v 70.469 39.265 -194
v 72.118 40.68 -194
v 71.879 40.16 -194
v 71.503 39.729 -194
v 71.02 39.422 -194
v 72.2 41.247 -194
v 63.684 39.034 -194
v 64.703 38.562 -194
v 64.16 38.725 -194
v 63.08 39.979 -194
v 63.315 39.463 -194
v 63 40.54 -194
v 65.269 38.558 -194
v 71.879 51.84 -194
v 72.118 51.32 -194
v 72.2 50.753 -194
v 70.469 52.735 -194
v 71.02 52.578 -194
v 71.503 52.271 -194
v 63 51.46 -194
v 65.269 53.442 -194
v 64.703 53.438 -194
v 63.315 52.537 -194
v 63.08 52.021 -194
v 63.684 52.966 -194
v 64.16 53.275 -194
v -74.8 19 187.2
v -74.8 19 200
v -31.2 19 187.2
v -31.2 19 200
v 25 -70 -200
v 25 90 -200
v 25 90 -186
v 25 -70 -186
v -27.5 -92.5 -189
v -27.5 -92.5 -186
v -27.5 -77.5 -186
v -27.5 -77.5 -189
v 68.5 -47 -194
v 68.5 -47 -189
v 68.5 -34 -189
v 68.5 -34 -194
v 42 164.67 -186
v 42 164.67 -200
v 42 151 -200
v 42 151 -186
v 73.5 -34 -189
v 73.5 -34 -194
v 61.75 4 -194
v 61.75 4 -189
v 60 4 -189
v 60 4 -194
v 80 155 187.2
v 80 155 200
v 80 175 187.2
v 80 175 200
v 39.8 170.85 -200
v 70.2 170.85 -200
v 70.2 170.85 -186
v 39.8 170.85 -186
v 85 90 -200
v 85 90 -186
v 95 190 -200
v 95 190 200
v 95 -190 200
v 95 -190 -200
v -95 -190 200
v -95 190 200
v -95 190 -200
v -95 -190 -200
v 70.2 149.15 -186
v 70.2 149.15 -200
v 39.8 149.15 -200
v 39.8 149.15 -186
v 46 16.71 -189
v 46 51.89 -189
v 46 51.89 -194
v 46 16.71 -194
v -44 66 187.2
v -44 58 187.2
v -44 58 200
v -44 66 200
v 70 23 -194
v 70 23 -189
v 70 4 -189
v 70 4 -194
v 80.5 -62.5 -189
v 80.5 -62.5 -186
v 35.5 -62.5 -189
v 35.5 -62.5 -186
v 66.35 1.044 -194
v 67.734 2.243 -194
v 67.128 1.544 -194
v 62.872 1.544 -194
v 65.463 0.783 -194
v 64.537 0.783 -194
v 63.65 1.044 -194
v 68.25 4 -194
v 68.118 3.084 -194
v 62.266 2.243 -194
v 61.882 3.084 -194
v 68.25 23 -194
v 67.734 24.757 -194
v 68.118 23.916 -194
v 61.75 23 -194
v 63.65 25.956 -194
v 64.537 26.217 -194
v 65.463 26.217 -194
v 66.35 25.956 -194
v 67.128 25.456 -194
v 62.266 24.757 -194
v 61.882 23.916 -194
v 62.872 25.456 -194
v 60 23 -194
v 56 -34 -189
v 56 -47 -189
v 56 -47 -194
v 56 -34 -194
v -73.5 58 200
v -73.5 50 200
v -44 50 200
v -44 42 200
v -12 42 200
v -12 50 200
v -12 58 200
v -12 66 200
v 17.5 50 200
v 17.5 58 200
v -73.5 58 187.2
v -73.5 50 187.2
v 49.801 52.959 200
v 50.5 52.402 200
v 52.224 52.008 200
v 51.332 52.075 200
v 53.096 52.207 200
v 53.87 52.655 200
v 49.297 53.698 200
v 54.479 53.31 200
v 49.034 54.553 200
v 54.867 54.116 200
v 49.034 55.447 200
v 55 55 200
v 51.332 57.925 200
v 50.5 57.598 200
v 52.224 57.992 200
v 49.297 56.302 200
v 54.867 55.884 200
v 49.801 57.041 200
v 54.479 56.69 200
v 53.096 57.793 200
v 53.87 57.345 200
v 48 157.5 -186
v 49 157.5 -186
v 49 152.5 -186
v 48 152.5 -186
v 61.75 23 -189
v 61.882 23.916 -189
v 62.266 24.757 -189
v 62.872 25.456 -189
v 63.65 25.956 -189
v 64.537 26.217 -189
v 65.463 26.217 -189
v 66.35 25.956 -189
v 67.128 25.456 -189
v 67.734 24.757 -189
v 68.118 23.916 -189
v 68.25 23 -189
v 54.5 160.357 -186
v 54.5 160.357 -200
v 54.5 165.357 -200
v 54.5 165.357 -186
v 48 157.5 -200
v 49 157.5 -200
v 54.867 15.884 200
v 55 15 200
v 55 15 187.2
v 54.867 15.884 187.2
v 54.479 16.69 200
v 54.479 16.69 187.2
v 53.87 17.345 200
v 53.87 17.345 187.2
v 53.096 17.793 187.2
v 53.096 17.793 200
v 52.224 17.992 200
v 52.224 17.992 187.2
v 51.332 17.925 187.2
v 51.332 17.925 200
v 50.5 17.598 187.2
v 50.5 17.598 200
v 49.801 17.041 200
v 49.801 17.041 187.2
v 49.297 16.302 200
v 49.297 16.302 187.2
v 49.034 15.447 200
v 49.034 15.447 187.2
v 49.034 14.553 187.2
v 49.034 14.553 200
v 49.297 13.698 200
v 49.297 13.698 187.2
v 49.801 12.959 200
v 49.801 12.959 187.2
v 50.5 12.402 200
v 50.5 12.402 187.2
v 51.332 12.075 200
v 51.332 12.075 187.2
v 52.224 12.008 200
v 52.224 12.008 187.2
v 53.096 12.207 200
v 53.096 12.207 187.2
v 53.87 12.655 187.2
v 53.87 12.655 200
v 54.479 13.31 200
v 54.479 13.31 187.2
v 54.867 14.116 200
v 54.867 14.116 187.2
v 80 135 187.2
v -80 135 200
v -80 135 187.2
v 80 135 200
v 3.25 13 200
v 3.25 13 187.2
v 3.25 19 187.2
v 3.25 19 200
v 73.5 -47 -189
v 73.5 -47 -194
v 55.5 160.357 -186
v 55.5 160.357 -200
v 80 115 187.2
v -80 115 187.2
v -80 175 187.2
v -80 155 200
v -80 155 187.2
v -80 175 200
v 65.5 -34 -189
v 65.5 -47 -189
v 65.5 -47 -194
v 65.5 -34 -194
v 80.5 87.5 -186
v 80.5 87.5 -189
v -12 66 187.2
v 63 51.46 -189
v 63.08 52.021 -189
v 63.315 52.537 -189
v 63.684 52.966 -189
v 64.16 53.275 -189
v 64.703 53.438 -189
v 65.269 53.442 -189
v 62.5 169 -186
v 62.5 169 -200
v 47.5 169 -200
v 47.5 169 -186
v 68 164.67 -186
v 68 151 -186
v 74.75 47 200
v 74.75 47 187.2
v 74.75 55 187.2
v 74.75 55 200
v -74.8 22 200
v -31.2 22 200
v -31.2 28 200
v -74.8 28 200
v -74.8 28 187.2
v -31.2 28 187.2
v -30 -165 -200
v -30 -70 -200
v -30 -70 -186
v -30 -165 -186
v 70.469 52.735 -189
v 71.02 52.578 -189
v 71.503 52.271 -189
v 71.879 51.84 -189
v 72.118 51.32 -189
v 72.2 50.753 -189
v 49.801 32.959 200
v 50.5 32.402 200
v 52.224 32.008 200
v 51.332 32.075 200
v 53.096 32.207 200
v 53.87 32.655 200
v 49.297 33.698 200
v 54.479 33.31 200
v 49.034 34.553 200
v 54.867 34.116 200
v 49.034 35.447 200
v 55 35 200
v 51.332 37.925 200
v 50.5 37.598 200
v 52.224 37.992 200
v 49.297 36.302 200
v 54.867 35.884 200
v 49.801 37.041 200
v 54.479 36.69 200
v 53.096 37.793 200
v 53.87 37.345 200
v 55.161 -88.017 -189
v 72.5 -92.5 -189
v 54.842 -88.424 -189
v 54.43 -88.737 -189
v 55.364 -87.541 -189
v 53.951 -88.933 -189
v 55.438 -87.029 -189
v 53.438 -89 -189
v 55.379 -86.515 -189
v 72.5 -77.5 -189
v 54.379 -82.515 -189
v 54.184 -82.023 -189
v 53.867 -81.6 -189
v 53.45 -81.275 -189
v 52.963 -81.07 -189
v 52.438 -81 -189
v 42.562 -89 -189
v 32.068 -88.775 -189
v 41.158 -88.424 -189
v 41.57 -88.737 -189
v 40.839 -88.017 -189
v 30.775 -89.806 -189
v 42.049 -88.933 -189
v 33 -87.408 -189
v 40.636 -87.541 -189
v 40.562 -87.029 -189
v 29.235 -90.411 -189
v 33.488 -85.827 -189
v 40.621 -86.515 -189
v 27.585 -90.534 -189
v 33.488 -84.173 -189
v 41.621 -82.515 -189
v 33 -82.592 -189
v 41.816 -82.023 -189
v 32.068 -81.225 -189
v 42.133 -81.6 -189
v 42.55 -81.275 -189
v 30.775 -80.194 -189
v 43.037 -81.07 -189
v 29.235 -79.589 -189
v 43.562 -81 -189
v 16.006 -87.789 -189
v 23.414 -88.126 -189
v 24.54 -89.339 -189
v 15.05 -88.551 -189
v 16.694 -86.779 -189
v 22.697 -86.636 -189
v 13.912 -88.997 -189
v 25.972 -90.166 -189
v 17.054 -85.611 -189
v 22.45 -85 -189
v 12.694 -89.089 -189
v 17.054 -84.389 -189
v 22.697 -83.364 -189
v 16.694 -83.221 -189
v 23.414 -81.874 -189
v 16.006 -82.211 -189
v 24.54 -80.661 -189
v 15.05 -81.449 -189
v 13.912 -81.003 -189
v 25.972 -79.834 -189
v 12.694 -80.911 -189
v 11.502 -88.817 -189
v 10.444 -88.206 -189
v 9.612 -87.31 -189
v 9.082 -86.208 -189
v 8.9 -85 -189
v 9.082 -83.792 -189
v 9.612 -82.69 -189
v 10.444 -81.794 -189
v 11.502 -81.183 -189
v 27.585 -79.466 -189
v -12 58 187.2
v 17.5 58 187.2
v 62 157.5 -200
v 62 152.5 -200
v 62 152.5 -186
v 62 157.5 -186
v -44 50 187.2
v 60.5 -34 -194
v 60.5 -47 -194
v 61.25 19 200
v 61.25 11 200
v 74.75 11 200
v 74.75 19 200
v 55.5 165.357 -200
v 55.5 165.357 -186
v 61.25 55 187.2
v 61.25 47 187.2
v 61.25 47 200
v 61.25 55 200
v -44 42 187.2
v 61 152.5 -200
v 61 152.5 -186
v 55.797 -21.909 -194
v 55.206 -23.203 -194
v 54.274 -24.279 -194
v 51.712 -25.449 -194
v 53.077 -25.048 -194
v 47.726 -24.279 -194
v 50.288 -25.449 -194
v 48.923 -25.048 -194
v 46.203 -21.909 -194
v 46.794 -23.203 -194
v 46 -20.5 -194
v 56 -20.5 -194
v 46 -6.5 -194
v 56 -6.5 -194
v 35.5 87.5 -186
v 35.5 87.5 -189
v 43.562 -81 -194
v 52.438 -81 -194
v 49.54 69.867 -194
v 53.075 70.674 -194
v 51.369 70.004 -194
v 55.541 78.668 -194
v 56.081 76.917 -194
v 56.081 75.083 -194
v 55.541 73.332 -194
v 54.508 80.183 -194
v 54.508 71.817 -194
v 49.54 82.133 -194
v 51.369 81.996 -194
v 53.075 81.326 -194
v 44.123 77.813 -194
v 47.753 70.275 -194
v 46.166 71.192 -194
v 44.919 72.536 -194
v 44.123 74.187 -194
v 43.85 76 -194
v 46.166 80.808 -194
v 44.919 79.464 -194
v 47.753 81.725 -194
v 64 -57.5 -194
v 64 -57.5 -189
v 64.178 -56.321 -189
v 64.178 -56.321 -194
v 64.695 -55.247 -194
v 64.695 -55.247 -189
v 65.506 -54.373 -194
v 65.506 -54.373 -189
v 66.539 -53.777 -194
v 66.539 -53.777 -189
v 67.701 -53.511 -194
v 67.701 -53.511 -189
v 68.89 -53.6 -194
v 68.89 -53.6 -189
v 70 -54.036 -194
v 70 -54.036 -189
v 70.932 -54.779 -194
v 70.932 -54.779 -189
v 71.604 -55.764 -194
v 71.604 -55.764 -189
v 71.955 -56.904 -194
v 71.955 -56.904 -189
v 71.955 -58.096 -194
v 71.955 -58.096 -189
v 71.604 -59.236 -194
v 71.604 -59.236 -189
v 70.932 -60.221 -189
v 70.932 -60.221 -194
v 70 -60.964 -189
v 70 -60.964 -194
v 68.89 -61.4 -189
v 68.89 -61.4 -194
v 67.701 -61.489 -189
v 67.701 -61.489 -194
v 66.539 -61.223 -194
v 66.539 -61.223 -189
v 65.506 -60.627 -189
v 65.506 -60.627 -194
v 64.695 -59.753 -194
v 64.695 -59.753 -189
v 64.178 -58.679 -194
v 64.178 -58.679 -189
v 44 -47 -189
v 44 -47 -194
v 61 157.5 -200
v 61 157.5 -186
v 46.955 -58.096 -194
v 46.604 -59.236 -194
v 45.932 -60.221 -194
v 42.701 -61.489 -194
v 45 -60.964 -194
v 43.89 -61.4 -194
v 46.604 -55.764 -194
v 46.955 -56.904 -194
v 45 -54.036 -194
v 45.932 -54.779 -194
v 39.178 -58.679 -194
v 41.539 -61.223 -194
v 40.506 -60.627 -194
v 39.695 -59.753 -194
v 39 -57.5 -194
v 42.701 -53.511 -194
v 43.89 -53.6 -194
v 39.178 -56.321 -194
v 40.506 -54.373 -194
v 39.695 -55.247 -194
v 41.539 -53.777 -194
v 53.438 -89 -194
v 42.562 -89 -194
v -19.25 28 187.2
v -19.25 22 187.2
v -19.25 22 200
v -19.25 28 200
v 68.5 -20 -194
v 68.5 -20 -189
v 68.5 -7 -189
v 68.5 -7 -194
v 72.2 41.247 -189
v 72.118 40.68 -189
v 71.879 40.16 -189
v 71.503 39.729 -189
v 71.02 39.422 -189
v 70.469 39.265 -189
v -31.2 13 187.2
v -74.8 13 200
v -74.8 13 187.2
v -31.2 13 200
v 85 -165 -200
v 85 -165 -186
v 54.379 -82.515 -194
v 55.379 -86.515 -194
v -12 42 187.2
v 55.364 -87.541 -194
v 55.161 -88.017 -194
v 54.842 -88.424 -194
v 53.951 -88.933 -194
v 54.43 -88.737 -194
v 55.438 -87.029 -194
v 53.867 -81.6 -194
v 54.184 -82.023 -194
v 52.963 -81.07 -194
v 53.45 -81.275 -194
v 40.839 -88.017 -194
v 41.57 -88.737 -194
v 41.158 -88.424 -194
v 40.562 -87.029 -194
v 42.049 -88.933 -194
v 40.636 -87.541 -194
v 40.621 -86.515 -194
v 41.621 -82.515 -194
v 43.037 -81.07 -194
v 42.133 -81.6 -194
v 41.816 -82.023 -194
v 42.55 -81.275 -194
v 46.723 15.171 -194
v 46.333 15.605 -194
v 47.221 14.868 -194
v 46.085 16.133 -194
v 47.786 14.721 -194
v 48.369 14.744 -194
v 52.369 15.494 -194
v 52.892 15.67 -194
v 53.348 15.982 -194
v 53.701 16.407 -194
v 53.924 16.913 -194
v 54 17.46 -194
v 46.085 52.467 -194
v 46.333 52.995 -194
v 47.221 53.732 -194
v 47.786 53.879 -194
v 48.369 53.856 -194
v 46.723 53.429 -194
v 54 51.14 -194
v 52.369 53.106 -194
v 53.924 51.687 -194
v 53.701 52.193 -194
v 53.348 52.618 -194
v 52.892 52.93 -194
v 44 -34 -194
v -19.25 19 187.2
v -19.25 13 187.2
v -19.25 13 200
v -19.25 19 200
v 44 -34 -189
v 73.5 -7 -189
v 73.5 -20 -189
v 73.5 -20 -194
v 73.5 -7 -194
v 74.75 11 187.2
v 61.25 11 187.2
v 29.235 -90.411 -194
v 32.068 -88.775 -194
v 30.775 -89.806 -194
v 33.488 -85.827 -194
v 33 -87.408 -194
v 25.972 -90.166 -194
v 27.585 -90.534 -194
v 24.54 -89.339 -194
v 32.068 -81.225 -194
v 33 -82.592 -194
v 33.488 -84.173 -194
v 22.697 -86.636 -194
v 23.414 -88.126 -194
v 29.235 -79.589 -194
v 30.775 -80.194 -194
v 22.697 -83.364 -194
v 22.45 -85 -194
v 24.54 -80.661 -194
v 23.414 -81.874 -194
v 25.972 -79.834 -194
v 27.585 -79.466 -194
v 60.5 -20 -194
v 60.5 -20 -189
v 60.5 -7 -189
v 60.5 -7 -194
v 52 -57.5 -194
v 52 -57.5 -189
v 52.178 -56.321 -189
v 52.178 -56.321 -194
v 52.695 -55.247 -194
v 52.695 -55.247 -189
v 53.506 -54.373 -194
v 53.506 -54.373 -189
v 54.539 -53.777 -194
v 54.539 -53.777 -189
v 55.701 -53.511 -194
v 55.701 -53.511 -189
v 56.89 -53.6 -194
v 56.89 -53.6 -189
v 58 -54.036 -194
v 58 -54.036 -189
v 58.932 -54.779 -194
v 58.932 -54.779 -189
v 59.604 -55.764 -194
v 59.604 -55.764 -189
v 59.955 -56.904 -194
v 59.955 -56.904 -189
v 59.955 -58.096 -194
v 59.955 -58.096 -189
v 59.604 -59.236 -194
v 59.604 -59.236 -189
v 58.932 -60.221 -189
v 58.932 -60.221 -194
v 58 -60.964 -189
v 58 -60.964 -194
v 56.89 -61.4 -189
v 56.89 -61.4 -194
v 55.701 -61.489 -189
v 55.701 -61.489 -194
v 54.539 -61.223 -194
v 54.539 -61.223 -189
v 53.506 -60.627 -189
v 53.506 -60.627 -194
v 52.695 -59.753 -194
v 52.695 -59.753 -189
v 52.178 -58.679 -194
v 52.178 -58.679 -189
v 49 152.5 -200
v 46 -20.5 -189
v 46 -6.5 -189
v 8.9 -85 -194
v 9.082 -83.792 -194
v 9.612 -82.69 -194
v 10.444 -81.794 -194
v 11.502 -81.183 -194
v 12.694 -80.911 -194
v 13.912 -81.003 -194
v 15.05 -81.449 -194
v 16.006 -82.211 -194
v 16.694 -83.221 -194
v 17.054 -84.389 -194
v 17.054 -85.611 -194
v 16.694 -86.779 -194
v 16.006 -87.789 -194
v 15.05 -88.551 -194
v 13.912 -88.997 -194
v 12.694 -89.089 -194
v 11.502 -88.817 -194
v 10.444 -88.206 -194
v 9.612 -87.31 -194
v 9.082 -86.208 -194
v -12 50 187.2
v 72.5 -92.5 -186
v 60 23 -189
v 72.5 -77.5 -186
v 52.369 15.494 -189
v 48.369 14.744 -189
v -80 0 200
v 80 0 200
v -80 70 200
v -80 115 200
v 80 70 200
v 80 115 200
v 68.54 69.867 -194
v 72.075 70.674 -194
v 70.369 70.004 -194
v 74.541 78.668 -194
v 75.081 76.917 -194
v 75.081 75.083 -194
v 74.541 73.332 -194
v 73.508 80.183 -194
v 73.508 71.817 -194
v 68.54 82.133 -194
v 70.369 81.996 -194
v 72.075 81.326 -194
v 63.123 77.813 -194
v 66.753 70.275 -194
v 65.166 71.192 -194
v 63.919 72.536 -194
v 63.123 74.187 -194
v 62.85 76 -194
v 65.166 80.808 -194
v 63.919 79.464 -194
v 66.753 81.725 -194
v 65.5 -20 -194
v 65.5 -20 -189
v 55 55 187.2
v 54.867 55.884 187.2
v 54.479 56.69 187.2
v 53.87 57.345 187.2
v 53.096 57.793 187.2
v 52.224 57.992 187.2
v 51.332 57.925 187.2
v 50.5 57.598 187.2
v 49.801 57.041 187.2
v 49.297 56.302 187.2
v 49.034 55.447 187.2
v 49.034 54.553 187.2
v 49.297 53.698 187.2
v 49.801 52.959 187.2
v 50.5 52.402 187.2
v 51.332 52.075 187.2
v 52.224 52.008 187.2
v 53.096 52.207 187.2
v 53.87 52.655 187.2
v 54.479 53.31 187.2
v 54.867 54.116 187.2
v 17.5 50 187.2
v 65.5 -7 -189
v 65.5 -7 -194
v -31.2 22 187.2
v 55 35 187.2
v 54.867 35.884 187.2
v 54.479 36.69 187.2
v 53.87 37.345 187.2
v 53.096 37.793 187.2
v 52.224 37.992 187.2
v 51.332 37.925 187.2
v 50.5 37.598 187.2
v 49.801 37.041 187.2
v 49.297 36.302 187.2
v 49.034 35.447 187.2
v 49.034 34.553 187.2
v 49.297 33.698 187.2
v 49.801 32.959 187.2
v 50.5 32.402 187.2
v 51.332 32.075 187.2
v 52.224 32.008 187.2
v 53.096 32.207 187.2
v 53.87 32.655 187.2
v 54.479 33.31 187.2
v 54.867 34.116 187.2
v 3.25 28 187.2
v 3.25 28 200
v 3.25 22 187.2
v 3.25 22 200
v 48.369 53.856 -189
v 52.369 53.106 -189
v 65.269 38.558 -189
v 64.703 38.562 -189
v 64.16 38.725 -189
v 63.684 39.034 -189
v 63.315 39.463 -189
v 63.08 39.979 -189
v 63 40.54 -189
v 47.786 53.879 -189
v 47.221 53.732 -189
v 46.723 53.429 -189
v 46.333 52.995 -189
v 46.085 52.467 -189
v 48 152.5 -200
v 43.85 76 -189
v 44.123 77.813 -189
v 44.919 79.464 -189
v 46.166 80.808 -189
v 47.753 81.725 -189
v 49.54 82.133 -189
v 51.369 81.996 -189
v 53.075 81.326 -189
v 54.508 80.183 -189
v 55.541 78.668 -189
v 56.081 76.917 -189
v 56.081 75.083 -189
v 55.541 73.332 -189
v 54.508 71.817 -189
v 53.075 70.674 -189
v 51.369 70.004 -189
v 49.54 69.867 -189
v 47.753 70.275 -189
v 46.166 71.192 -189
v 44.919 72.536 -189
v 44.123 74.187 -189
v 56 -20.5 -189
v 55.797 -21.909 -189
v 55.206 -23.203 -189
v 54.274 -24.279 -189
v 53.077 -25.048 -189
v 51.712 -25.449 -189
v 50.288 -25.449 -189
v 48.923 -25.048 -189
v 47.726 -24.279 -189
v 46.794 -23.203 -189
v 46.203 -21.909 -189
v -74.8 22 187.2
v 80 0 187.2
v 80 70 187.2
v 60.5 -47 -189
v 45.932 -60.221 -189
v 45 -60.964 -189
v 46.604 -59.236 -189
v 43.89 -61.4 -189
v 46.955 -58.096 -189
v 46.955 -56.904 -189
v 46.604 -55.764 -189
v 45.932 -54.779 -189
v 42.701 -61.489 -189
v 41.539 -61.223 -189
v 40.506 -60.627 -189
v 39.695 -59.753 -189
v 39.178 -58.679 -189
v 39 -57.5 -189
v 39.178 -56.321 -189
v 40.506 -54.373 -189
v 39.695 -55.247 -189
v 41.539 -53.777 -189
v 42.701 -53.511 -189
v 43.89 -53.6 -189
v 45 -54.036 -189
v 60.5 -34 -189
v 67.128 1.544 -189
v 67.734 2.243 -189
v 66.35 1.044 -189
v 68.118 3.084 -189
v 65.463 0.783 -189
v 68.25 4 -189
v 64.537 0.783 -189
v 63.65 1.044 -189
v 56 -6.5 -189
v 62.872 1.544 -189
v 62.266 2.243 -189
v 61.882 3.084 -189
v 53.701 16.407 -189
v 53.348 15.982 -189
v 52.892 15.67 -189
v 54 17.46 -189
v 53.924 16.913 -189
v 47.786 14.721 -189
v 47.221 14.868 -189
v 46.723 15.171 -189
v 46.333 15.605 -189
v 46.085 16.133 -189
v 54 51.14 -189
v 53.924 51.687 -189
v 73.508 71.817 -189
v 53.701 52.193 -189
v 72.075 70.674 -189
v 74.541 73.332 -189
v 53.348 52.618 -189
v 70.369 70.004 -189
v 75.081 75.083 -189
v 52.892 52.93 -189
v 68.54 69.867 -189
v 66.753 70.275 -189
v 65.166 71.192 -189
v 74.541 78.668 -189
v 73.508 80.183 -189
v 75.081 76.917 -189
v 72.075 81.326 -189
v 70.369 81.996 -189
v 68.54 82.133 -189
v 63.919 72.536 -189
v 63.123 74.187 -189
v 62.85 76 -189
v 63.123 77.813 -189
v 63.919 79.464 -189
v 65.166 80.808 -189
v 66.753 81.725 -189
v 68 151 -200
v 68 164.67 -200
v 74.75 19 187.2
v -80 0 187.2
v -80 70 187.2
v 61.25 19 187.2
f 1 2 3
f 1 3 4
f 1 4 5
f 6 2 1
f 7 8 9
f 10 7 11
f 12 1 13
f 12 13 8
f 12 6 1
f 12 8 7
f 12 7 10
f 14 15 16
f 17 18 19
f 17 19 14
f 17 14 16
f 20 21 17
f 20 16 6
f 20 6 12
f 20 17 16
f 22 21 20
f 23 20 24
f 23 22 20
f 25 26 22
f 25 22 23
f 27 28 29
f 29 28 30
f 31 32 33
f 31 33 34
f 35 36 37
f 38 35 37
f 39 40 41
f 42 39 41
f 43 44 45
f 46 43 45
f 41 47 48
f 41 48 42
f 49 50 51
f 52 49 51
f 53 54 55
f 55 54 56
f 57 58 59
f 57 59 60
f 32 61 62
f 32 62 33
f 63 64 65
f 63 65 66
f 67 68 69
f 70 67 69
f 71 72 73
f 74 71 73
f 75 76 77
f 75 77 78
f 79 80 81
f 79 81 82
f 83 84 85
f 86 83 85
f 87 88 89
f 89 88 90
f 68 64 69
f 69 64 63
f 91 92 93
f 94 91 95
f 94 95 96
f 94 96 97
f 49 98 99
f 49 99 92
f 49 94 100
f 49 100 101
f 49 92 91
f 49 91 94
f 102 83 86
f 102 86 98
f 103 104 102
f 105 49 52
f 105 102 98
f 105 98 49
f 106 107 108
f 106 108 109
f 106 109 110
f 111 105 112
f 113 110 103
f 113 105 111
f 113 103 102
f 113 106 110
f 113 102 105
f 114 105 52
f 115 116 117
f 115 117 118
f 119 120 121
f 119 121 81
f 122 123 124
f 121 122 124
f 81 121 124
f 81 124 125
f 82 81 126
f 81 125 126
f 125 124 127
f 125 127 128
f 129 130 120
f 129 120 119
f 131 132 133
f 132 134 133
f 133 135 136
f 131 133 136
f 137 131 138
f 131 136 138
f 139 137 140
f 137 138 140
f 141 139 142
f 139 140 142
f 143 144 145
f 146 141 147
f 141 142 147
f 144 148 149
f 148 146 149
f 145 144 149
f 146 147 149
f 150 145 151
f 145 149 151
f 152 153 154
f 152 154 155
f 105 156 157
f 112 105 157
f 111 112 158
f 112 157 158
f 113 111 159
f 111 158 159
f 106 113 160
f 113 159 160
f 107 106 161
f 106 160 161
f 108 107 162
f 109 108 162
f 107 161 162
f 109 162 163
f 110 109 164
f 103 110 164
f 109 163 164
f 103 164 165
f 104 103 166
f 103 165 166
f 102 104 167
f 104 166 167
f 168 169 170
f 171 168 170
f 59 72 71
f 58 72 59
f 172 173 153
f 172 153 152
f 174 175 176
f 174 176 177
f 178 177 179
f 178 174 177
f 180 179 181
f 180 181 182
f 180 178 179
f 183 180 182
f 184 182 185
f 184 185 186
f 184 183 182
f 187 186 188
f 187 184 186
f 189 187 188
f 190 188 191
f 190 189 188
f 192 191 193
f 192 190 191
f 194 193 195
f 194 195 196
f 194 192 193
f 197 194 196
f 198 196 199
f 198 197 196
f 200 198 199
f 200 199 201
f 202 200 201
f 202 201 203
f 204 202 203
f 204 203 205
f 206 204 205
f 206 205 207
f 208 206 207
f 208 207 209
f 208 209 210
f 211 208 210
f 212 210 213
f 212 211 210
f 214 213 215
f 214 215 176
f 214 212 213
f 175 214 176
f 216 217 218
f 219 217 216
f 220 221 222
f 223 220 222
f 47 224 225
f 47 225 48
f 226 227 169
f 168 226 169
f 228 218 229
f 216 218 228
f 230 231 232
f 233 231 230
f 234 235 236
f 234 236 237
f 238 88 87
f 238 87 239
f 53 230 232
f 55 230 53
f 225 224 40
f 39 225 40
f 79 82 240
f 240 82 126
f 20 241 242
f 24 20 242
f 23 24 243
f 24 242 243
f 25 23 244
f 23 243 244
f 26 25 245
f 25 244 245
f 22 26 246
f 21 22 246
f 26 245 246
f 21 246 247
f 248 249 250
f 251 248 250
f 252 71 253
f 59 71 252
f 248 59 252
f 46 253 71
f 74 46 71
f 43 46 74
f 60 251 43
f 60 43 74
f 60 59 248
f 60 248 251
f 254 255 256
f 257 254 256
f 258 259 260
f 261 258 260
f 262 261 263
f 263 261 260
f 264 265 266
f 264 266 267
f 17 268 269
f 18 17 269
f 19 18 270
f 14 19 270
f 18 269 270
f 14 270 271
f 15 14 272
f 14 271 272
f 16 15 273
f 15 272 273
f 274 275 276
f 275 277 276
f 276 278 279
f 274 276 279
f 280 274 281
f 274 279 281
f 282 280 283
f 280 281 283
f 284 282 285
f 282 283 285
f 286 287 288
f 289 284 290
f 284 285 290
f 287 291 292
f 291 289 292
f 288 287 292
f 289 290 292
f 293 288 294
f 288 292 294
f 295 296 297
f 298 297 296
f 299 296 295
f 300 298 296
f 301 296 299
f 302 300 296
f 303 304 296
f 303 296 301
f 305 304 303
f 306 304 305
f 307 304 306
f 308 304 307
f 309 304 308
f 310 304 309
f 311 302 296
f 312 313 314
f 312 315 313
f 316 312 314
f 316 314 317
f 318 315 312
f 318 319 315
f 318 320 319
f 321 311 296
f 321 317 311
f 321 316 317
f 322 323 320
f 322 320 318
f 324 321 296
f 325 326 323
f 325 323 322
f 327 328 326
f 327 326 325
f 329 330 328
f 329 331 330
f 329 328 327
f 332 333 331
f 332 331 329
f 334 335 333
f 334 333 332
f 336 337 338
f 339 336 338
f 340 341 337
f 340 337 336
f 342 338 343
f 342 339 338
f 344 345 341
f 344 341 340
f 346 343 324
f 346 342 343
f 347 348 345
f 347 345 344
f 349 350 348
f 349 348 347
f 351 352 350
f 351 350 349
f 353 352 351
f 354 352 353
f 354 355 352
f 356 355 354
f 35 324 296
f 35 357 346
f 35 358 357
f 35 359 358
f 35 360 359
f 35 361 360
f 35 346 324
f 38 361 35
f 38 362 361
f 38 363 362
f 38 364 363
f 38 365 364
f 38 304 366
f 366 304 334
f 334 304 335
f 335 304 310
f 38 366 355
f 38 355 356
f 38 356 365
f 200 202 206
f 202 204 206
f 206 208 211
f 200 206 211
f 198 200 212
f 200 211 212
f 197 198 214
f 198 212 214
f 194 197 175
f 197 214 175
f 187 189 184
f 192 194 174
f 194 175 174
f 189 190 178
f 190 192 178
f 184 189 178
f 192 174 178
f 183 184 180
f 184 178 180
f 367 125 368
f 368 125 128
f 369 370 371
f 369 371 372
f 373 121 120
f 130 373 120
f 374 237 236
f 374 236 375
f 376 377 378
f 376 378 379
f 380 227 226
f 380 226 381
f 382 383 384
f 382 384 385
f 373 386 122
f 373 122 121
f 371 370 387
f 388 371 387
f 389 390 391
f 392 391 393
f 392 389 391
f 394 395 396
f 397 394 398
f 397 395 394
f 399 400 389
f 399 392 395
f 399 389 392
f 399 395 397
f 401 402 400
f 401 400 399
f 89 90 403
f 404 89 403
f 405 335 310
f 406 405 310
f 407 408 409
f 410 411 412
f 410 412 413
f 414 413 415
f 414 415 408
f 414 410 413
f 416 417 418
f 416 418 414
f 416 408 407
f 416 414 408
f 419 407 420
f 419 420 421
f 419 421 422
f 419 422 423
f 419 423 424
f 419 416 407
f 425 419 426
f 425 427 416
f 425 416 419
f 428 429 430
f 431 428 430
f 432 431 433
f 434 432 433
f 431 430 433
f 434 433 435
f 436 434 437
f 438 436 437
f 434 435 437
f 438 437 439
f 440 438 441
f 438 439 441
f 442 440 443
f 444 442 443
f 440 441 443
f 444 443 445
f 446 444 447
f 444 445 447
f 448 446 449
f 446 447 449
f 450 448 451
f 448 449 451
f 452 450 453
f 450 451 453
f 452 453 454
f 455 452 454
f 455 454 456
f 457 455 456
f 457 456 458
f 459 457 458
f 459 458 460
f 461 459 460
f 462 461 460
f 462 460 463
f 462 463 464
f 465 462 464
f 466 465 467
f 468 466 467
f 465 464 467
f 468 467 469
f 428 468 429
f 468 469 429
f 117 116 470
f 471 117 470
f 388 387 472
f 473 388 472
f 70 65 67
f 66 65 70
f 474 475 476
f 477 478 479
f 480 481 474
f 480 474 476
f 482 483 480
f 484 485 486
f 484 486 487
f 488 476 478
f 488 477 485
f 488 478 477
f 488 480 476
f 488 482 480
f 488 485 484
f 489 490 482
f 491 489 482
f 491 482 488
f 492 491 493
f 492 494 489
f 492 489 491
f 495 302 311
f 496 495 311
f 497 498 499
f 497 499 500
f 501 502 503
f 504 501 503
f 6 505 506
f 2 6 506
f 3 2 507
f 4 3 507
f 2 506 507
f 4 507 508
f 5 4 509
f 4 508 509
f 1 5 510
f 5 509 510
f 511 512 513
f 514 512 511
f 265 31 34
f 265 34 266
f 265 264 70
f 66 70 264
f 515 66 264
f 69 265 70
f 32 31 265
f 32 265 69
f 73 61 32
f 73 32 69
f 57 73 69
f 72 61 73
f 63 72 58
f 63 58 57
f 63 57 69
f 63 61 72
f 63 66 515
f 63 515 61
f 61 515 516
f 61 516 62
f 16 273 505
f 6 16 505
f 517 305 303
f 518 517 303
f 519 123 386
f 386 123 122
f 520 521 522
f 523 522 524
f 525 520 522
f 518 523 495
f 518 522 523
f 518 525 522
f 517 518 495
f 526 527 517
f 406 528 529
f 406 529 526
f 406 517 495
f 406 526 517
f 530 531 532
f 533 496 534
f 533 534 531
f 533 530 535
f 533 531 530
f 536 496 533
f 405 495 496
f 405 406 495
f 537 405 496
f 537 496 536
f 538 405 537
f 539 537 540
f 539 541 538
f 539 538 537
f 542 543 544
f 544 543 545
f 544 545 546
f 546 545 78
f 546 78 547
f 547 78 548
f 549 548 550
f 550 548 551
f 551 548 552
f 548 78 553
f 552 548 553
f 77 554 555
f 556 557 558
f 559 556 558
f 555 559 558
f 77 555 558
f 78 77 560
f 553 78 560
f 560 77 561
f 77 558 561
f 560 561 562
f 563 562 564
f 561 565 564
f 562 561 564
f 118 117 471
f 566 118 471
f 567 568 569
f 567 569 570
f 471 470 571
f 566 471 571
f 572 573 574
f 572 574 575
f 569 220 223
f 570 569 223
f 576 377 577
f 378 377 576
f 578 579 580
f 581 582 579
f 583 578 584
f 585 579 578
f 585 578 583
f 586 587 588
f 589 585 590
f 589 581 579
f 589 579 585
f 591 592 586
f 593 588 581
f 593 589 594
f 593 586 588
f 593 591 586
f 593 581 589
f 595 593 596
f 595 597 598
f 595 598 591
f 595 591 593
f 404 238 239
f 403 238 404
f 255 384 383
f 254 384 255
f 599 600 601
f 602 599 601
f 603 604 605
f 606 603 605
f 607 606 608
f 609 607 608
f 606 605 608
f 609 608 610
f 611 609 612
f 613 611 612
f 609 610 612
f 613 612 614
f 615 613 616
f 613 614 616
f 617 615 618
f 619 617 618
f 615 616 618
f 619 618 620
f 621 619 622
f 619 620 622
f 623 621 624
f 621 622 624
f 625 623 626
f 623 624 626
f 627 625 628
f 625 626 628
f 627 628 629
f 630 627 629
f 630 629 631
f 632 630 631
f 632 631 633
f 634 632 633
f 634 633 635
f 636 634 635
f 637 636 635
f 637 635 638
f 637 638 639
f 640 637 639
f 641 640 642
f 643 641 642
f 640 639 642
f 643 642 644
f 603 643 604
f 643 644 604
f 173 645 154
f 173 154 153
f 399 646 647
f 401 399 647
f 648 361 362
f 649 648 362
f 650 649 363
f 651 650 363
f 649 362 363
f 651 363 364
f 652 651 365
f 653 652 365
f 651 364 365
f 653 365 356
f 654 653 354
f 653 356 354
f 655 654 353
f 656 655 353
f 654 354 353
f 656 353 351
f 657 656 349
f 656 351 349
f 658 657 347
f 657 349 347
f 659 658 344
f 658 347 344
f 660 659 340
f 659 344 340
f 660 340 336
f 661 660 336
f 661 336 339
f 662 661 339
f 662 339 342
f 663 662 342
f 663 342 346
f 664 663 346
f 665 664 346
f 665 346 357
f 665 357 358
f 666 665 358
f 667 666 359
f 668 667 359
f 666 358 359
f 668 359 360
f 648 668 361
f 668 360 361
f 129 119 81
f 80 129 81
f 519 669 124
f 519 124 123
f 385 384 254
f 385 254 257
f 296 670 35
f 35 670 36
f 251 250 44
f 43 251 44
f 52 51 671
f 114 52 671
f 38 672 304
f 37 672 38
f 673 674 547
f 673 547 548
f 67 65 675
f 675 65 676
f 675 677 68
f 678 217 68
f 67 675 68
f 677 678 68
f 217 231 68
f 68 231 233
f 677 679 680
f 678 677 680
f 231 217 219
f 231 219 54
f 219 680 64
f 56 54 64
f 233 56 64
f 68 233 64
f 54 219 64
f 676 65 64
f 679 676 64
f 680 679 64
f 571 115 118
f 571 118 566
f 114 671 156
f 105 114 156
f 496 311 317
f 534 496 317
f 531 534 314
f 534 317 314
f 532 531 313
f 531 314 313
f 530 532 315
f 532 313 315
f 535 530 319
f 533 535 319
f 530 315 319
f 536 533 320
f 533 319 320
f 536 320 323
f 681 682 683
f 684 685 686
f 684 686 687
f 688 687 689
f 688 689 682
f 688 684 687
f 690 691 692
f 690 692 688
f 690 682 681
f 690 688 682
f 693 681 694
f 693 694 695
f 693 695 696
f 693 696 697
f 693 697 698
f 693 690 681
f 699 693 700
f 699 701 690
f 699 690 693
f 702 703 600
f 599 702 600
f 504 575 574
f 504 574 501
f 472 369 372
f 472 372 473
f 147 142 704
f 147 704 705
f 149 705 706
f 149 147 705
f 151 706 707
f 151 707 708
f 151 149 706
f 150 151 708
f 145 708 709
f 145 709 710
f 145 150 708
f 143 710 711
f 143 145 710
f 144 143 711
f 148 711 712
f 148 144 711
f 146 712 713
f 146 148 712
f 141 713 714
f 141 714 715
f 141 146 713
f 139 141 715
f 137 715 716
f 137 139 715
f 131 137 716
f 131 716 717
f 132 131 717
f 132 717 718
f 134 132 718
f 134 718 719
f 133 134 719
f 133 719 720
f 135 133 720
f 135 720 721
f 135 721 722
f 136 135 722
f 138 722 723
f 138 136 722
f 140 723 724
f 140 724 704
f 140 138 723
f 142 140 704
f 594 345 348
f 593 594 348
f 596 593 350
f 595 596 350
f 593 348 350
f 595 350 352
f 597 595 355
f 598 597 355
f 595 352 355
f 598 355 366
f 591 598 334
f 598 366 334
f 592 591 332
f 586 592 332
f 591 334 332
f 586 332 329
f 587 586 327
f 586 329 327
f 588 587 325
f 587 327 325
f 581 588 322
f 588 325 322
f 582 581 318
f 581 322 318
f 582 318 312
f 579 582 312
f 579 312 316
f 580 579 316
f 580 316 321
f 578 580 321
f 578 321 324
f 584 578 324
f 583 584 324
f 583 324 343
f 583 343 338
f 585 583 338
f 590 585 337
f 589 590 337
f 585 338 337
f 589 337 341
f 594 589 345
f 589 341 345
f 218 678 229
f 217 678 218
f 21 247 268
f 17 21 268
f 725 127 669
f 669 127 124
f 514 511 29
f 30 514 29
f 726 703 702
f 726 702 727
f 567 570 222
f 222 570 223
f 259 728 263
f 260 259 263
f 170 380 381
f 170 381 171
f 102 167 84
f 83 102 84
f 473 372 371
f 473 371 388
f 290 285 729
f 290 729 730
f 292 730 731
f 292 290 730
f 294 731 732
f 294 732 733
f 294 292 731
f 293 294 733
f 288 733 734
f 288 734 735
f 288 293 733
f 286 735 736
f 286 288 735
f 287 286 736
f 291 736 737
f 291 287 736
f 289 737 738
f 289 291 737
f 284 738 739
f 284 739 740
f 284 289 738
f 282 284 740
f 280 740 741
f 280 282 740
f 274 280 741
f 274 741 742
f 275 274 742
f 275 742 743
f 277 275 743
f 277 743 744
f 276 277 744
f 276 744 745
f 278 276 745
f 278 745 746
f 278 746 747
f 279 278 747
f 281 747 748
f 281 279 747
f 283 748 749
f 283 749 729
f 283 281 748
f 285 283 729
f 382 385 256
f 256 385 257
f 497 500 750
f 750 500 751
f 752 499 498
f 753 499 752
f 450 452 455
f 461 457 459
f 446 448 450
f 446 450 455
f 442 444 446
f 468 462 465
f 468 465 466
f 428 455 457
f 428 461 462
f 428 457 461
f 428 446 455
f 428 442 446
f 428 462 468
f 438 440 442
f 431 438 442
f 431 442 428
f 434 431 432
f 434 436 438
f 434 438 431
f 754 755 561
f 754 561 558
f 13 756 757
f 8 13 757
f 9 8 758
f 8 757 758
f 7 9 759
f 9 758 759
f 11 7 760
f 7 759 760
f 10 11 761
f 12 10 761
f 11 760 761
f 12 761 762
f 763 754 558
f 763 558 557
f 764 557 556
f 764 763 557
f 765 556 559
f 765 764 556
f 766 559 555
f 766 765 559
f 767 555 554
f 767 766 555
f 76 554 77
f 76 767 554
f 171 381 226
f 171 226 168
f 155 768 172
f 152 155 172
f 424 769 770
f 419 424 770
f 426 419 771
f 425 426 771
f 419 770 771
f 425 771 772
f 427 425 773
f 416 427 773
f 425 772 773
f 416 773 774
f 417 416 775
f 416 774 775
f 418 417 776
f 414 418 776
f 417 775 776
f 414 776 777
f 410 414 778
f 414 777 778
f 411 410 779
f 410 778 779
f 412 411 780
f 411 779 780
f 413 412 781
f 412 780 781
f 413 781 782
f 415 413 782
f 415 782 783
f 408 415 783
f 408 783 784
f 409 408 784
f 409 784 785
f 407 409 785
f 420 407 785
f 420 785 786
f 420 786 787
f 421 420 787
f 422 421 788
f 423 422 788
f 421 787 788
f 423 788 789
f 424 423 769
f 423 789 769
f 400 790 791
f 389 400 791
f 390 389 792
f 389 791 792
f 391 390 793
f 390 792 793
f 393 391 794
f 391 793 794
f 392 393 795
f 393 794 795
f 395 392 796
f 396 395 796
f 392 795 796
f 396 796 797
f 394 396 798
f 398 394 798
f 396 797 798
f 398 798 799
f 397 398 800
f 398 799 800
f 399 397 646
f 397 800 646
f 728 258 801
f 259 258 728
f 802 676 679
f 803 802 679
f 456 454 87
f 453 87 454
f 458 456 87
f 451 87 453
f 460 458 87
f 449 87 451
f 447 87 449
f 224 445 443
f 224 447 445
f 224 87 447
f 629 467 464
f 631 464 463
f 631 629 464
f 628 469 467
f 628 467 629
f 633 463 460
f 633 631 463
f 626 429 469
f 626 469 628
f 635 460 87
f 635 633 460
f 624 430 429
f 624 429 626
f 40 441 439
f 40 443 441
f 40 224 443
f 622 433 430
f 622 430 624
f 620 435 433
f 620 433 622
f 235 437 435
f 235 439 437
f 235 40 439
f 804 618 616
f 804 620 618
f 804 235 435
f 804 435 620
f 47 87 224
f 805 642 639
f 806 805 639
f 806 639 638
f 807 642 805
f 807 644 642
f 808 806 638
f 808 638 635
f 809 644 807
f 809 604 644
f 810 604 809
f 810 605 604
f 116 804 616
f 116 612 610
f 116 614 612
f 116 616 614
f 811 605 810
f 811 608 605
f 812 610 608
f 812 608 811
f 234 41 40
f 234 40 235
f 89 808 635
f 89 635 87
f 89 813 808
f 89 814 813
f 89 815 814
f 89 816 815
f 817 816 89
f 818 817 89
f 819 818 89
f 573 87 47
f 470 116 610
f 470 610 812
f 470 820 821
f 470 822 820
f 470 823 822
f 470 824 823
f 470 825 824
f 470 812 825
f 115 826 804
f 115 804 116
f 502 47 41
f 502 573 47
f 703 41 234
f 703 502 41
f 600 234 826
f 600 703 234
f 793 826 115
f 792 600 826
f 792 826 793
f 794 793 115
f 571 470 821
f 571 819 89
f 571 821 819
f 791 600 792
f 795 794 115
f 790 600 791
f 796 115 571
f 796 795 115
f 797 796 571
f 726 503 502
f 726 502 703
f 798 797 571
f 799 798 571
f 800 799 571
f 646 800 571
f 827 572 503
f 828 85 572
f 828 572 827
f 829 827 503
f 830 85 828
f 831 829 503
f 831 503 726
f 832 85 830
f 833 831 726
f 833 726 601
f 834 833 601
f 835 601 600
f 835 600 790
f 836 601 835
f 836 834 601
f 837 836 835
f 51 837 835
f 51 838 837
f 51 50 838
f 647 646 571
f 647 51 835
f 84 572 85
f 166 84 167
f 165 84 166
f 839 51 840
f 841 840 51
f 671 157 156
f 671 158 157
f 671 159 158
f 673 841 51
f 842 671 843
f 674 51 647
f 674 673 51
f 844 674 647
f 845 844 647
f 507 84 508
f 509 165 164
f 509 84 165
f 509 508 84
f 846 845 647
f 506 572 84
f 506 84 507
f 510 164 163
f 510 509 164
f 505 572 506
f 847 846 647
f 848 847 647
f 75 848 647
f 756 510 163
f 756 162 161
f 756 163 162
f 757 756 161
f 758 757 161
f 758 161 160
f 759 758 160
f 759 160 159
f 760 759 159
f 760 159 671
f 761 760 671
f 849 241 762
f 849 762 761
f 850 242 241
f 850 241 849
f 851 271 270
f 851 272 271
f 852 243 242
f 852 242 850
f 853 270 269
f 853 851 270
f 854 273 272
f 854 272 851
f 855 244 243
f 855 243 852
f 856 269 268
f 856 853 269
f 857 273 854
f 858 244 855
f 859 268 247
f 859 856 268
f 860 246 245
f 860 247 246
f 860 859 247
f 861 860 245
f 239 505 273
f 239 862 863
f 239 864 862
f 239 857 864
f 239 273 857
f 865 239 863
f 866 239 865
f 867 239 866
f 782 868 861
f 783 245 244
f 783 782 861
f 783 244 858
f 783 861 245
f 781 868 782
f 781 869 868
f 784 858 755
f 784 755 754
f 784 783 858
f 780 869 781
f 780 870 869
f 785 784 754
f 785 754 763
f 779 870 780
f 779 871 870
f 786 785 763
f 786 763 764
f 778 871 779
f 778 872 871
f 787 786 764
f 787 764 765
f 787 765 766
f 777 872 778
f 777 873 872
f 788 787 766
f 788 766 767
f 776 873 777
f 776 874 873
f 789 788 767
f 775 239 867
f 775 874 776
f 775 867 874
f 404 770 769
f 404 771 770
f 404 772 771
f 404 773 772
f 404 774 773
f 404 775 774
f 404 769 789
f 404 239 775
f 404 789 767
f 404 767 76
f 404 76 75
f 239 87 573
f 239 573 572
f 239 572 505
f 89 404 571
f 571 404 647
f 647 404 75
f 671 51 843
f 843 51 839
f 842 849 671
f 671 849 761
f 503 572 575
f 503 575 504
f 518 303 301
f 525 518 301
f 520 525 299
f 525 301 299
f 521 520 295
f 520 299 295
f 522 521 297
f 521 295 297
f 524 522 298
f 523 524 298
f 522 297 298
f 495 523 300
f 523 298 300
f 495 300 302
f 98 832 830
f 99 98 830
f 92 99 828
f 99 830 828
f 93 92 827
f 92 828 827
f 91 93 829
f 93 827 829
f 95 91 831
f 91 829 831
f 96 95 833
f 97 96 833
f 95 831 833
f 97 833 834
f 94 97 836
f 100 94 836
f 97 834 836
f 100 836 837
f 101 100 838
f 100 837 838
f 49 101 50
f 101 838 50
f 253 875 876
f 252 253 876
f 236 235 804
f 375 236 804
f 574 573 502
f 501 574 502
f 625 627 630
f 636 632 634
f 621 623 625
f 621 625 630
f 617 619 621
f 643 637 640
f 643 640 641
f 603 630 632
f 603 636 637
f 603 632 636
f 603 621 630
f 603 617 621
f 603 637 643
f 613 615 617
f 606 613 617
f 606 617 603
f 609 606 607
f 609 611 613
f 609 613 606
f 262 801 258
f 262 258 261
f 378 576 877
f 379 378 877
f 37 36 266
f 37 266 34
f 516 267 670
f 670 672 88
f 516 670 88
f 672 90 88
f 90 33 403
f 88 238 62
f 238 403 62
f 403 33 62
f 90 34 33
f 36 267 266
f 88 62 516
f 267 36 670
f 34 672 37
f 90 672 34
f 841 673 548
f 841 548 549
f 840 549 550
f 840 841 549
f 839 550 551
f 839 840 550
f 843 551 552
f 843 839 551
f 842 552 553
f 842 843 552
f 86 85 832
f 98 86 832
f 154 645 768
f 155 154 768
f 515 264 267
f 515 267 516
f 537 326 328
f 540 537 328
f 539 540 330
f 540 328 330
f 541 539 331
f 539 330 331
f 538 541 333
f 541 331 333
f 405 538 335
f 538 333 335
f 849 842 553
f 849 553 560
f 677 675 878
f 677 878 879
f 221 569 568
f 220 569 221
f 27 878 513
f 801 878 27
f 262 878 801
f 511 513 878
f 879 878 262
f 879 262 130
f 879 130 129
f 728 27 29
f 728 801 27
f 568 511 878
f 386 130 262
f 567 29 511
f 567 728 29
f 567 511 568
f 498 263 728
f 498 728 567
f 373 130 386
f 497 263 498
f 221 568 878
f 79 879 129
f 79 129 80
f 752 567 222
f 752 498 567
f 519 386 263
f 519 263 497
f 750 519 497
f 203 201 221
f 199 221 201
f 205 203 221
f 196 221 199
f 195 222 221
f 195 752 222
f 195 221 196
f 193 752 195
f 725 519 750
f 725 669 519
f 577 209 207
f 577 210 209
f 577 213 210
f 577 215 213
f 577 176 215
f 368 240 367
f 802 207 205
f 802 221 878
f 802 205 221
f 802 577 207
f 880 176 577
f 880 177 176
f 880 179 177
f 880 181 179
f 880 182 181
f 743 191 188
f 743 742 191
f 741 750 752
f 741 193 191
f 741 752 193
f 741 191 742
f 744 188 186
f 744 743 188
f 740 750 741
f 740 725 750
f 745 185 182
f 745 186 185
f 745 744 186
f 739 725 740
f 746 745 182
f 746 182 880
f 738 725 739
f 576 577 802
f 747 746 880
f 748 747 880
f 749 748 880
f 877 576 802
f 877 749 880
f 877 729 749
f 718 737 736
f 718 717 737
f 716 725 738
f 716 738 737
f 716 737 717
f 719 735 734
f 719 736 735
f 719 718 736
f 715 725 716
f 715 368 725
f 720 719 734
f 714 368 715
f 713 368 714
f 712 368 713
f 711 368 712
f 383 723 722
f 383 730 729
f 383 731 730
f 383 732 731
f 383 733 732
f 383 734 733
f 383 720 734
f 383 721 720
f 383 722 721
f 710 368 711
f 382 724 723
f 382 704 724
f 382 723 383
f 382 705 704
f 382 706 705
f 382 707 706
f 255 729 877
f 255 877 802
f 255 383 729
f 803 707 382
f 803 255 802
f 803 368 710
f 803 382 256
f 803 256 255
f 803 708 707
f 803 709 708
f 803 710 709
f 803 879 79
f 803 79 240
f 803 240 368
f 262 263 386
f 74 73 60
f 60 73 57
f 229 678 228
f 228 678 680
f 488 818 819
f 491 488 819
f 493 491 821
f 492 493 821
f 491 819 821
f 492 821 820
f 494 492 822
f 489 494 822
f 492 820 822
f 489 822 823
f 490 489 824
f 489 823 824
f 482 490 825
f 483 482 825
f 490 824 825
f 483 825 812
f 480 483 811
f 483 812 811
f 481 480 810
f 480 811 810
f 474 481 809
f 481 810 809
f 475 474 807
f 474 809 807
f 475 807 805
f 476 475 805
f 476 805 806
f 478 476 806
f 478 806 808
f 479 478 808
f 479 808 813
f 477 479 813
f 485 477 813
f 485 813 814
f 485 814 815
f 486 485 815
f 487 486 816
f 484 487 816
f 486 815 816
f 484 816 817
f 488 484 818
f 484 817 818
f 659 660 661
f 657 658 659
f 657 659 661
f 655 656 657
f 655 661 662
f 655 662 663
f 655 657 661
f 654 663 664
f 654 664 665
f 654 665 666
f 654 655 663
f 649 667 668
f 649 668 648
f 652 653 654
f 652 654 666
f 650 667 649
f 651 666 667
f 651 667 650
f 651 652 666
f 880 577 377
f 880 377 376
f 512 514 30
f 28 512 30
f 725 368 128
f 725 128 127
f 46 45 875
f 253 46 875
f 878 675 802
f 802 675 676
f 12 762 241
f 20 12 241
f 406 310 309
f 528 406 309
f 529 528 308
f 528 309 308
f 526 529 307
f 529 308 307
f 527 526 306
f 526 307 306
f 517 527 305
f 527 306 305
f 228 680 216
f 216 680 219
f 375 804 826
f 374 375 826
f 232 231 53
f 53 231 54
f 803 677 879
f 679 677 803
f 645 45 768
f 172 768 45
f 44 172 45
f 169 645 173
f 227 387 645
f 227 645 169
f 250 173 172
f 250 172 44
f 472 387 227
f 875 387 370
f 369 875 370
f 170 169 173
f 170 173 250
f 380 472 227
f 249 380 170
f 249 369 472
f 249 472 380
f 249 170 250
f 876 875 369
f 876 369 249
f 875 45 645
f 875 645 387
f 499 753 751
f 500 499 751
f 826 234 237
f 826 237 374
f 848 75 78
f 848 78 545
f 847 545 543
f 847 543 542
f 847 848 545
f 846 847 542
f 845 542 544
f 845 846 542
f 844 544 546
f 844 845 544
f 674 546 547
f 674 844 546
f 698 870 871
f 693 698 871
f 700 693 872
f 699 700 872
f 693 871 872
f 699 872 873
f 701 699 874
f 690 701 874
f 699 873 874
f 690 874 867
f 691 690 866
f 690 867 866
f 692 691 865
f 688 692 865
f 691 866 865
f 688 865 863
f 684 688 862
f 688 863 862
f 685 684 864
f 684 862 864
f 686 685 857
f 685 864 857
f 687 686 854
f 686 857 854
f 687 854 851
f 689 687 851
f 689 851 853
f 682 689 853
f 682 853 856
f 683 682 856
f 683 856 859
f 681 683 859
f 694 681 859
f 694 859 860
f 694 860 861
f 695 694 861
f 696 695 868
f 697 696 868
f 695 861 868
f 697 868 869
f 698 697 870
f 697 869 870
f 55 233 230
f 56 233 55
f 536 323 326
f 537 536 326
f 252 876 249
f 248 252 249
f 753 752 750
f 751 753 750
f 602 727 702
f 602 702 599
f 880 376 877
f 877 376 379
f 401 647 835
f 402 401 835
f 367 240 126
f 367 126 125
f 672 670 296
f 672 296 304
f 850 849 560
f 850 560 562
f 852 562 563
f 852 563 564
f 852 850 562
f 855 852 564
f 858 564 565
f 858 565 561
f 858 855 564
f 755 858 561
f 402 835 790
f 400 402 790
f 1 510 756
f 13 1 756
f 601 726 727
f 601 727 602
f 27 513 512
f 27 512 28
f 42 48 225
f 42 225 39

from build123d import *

# Parameters (mm, degrees)
CROQUIS1_W              = 400
CROQUIS1_H              = 380
SALIENTE_EXTRUIR1_DEPTH = 95
CROQUIS2_W              = 30.4
CROQUIS2_H              = 21.7
CROQUIS2_W_2            = 1
CROQUIS2_H_2            = 5
CORTAR_EXTRUIR1_DEPTH   = 14
CROQUIS3_W              = 45
CROQUIS3_H              = 150
CROQUIS3_W_2            = 100
CROQUIS3_H_2            = 15
SALIENTE_EXTRUIR2_DEPTH = 3
CROQUIS4_R              = 6.15
CROQUIS4_R_2            = 4
CROQUIS4_W              = 5
CROQUIS4_H              = 13
CROQUIS4_W_2            = 12
SALIENTE_EXTRUIR3_DEPTH = 5
CROQUIS5_R              = 4.1
CROQUIS5_R_2            = 5.55
SALIENTE_EXTRUIR4_DEPTH = 5
CROQUIS6_W              = 160
CROQUIS6_H              = 70
CROQUIS6_W_2            = 43.6
CROQUIS6_H_2            = 6
CROQUIS6_W_3            = 22.5
CROQUIS6_R              = 3
CROQUIS6_W_4            = 13.5
CROQUIS6_H_3            = 8
CROQUIS6_H_4            = 20
CORTAR_EXTRUIR2_DEPTH   = 12.8


with BuildPart() as part:
    # Croquis1 → Saliente-Extruir1 (new body, symmetric)
    with BuildSketch(Plane(origin=(0, 0, 0), x_dir=(0, 0, -1), z_dir=(1, 0, 0))):
        Rectangle(CROQUIS1_W, CROQUIS1_H)
    extrude(amount=SALIENTE_EXTRUIR1_DEPTH, both=True)

    # Croquis2 → Cortar-Extruir1 (cut)
    with BuildSketch(Plane(origin=(0, 0, -200), x_dir=(-1, 0, 0), z_dir=(0, 0, -1))):
        with Locations((-55, 160)):
            Rectangle(CROQUIS2_W, CROQUIS2_H)
        Polygon((-42, 151), (-68, 151), (-68, 160), (-68, 164.669872981), (-62.5, 169), (-47.5, 169), (-42, 164.669872981), (-42, 160), align=None, mode=Mode.SUBTRACT)
        with Locations((-55, 162.856907895)):
            Rectangle(CROQUIS2_W_2, CROQUIS2_H_2)
        with Locations((-48.5, 155)):
            Rectangle(CROQUIS2_W_2, CROQUIS2_H_2)
        with Locations((-61.5, 155)):
            Rectangle(CROQUIS2_W_2, CROQUIS2_H_2)
        Polygon((-85, 90), (-25, 90), (-25, -70), (30, -70), (30, -165), (-85, -165), align=None)
    extrude(amount=-CORTAR_EXTRUIR1_DEPTH, mode=Mode.SUBTRACT)

    # Croquis3 → Saliente-Extruir2 (add)
    with BuildSketch(Plane(origin=(0, 0, -186), x_dir=(-1, 0, 0), z_dir=(0, 0, -1))):
        with Locations((-58, 12.5)):
            Rectangle(CROQUIS3_W, CROQUIS3_H)
        with Locations((-22.5, -85)):
            Rectangle(CROQUIS3_W_2, CROQUIS3_H_2)
    extrude(amount=SALIENTE_EXTRUIR2_DEPTH)

    # Croquis4 → Saliente-Extruir3 (add)
    with BuildSketch(Plane(origin=(0, 0, -189), x_dir=(-1, 0, 0), z_dir=(0, 0, -1))):
        with Locations((-69, 76)):
            Circle(CROQUIS4_R)
        with Locations((-50, 76)):
            Circle(CROQUIS4_R)
        with Locations((-68, -57.5)):
            Circle(CROQUIS4_R_2)
        with Locations((-56, -57.5)):
            Circle(CROQUIS4_R_2)
        with Locations((-43, -57.5)):
            Circle(CROQUIS4_R_2)
        with BuildLine():
            Line((-65.269265107, 53.441675937), (-70.469265107, 52.735154197))
            ThreePointArc((-70.469265107, 52.735154197), (-71.706408015, 52.068936991), (-72.2, 50.753363012))
            Line((-72.2, 50.753363012), (-72.2, 41.246636988))
            ThreePointArc((-72.2, 41.246636988), (-71.706408015, 39.931063009), (-70.469265107, 39.264845803))
            Line((-70.469265107, 39.264845803), (-65.269265107, 38.558324063))
            ThreePointArc((-65.269265107, 38.558324063), (-63.684426021, 39.033707234), (-63, 40.540115249))
            Line((-63, 40.540115249), (-63, 51.459884751))
            ThreePointArc((-63, 51.459884751), (-63.684426021, 52.966292766), (-65.269265107, 53.441675937))
        make_face()
        with BuildLine():
            Line((-52.36857707, 53.105891799), (-48.36857707, 53.855891799))
            ThreePointArc((-48.36857707, 53.855891799), (-46.722728326, 53.429165642), (-46, 51.890147425))
            Line((-46, 51.890147425), (-46, 16.709852575))
            ThreePointArc((-46, 16.709852575), (-46.722728326, 15.170834358), (-48.36857707, 14.744108201))
            Line((-48.36857707, 14.744108201), (-52.36857707, 15.494108201))
            ThreePointArc((-52.36857707, 15.494108201), (-53.539018216, 16.1825809), (-54, 17.459852575))
            Line((-54, 17.459852575), (-54, 51.140147425))
            ThreePointArc((-54, 51.140147425), (-53.539018216, 52.4174191), (-52.36857707, 53.105891799))
        make_face()
        with BuildLine():
            Line((-68.25, 23), (-70, 23))
            Line((-70, 23), (-70, 4))
            Line((-70, 4), (-68.25, 4))
            ThreePointArc((-68.25, 4), (-65, 0.75), (-61.75, 4))
            Line((-61.75, 4), (-60, 4))
            Line((-60, 4), (-60, 23))
            Line((-60, 23), (-61.75, 23))
            ThreePointArc((-61.75, 23), (-65, 26.25), (-68.25, 23))
        make_face()
        with Locations((-63, -13.5)):
            Rectangle(CROQUIS4_W, CROQUIS4_H)
        with Locations((-71, -13.5)):
            Rectangle(CROQUIS4_W, CROQUIS4_H)
        with Locations((-63, -40.5)):
            Rectangle(CROQUIS4_W, CROQUIS4_H)
        with Locations((-71, -40.5)):
            Rectangle(CROQUIS4_W, CROQUIS4_H)
        with BuildLine():
            Line((-46, -20.5), (-46, -6.5))
            Line((-46, -6.5), (-56, -6.5))
            Line((-56, -6.5), (-56, -20.5))
            ThreePointArc((-56, -20.5), (-51, -25.5), (-46, -20.5))
        make_face()
        with Locations((-50, -40.5)):
            Rectangle(CROQUIS4_W_2, CROQUIS4_H)
    extrude(amount=SALIENTE_EXTRUIR3_DEPTH)

    # Croquis5 → Saliente-Extruir4 (add)
    with BuildSketch(Plane(origin=(0, 0, -189), x_dir=(-1, 0, 0), z_dir=(0, 0, -1))):
        with Locations((-13, -85)):
            Circle(CROQUIS5_R)
        with Locations((-28, -85)):
            Circle(CROQUIS5_R_2)
        with BuildLine():
            Line((-54.378732187, -82.51492875), (-55.378732187, -86.51492875))
            ThreePointArc((-55.378732187, -86.51492875), (-55.014858063, -88.230824419), (-53.438447187, -89))
            Line((-53.438447187, -89), (-42.561552813, -89))
            ThreePointArc((-42.561552813, -89), (-40.985141937, -88.230824419), (-40.621267813, -86.51492875))
            Line((-40.621267813, -86.51492875), (-41.621267813, -82.51492875))
            ThreePointArc((-41.621267813, -82.51492875), (-42.330728394, -81.423589124), (-43.561552813, -81))
            Line((-43.561552813, -81), (-52.438447187, -81))
            ThreePointArc((-52.438447187, -81), (-53.669271606, -81.423589124), (-54.378732187, -82.51492875))
        make_face()
    extrude(amount=SALIENTE_EXTRUIR4_DEPTH)

    # Croquis6 → Cortar-Extruir2 (cut)
    with BuildSketch(Plane.XY.offset(200)):
        with Locations((0, 35)):
            Rectangle(CROQUIS6_W, CROQUIS6_H)
        with Locations((-53, 16)):
            Rectangle(CROQUIS6_W_2, CROQUIS6_H_2, mode=Mode.SUBTRACT)
        with Locations((-53, 25)):
            Rectangle(CROQUIS6_W_2, CROQUIS6_H_2, mode=Mode.SUBTRACT)
        with Locations((-8, 16)):
            Rectangle(CROQUIS6_W_3, CROQUIS6_H_2, mode=Mode.SUBTRACT)
        with Locations((-8, 25)):
            Rectangle(CROQUIS6_W_3, CROQUIS6_H_2, mode=Mode.SUBTRACT)
        Polygon((17.5, 58), (17.5, 50), (-12, 50), (-12, 42), (-44, 42), (-44, 50), (-73.5, 50), (-73.5, 58), (-44, 58), (-44, 66), (-12, 66), (-12, 58), align=None, mode=Mode.SUBTRACT)
        with Locations((52, 15)):
            Circle(CROQUIS6_R, mode=Mode.SUBTRACT)
        with Locations((68, 15)):
            Rectangle(CROQUIS6_W_4, CROQUIS6_H_3, mode=Mode.SUBTRACT)
        with Locations((52, 35)):
            Circle(CROQUIS6_R, mode=Mode.SUBTRACT)
        with Locations((52, 55)):
            Circle(CROQUIS6_R, mode=Mode.SUBTRACT)
        with Locations((68, 51)):
            Rectangle(CROQUIS6_W_4, CROQUIS6_H_3, mode=Mode.SUBTRACT)
        with Locations((0, 165)):
            Rectangle(CROQUIS6_W, CROQUIS6_H_4)
        with Locations((0, 125)):
            Rectangle(CROQUIS6_W, CROQUIS6_H_4)
    extrude(amount=-CORTAR_EXTRUIR2_DEPTH, mode=Mode.SUBTRACT)


solid = part.part
